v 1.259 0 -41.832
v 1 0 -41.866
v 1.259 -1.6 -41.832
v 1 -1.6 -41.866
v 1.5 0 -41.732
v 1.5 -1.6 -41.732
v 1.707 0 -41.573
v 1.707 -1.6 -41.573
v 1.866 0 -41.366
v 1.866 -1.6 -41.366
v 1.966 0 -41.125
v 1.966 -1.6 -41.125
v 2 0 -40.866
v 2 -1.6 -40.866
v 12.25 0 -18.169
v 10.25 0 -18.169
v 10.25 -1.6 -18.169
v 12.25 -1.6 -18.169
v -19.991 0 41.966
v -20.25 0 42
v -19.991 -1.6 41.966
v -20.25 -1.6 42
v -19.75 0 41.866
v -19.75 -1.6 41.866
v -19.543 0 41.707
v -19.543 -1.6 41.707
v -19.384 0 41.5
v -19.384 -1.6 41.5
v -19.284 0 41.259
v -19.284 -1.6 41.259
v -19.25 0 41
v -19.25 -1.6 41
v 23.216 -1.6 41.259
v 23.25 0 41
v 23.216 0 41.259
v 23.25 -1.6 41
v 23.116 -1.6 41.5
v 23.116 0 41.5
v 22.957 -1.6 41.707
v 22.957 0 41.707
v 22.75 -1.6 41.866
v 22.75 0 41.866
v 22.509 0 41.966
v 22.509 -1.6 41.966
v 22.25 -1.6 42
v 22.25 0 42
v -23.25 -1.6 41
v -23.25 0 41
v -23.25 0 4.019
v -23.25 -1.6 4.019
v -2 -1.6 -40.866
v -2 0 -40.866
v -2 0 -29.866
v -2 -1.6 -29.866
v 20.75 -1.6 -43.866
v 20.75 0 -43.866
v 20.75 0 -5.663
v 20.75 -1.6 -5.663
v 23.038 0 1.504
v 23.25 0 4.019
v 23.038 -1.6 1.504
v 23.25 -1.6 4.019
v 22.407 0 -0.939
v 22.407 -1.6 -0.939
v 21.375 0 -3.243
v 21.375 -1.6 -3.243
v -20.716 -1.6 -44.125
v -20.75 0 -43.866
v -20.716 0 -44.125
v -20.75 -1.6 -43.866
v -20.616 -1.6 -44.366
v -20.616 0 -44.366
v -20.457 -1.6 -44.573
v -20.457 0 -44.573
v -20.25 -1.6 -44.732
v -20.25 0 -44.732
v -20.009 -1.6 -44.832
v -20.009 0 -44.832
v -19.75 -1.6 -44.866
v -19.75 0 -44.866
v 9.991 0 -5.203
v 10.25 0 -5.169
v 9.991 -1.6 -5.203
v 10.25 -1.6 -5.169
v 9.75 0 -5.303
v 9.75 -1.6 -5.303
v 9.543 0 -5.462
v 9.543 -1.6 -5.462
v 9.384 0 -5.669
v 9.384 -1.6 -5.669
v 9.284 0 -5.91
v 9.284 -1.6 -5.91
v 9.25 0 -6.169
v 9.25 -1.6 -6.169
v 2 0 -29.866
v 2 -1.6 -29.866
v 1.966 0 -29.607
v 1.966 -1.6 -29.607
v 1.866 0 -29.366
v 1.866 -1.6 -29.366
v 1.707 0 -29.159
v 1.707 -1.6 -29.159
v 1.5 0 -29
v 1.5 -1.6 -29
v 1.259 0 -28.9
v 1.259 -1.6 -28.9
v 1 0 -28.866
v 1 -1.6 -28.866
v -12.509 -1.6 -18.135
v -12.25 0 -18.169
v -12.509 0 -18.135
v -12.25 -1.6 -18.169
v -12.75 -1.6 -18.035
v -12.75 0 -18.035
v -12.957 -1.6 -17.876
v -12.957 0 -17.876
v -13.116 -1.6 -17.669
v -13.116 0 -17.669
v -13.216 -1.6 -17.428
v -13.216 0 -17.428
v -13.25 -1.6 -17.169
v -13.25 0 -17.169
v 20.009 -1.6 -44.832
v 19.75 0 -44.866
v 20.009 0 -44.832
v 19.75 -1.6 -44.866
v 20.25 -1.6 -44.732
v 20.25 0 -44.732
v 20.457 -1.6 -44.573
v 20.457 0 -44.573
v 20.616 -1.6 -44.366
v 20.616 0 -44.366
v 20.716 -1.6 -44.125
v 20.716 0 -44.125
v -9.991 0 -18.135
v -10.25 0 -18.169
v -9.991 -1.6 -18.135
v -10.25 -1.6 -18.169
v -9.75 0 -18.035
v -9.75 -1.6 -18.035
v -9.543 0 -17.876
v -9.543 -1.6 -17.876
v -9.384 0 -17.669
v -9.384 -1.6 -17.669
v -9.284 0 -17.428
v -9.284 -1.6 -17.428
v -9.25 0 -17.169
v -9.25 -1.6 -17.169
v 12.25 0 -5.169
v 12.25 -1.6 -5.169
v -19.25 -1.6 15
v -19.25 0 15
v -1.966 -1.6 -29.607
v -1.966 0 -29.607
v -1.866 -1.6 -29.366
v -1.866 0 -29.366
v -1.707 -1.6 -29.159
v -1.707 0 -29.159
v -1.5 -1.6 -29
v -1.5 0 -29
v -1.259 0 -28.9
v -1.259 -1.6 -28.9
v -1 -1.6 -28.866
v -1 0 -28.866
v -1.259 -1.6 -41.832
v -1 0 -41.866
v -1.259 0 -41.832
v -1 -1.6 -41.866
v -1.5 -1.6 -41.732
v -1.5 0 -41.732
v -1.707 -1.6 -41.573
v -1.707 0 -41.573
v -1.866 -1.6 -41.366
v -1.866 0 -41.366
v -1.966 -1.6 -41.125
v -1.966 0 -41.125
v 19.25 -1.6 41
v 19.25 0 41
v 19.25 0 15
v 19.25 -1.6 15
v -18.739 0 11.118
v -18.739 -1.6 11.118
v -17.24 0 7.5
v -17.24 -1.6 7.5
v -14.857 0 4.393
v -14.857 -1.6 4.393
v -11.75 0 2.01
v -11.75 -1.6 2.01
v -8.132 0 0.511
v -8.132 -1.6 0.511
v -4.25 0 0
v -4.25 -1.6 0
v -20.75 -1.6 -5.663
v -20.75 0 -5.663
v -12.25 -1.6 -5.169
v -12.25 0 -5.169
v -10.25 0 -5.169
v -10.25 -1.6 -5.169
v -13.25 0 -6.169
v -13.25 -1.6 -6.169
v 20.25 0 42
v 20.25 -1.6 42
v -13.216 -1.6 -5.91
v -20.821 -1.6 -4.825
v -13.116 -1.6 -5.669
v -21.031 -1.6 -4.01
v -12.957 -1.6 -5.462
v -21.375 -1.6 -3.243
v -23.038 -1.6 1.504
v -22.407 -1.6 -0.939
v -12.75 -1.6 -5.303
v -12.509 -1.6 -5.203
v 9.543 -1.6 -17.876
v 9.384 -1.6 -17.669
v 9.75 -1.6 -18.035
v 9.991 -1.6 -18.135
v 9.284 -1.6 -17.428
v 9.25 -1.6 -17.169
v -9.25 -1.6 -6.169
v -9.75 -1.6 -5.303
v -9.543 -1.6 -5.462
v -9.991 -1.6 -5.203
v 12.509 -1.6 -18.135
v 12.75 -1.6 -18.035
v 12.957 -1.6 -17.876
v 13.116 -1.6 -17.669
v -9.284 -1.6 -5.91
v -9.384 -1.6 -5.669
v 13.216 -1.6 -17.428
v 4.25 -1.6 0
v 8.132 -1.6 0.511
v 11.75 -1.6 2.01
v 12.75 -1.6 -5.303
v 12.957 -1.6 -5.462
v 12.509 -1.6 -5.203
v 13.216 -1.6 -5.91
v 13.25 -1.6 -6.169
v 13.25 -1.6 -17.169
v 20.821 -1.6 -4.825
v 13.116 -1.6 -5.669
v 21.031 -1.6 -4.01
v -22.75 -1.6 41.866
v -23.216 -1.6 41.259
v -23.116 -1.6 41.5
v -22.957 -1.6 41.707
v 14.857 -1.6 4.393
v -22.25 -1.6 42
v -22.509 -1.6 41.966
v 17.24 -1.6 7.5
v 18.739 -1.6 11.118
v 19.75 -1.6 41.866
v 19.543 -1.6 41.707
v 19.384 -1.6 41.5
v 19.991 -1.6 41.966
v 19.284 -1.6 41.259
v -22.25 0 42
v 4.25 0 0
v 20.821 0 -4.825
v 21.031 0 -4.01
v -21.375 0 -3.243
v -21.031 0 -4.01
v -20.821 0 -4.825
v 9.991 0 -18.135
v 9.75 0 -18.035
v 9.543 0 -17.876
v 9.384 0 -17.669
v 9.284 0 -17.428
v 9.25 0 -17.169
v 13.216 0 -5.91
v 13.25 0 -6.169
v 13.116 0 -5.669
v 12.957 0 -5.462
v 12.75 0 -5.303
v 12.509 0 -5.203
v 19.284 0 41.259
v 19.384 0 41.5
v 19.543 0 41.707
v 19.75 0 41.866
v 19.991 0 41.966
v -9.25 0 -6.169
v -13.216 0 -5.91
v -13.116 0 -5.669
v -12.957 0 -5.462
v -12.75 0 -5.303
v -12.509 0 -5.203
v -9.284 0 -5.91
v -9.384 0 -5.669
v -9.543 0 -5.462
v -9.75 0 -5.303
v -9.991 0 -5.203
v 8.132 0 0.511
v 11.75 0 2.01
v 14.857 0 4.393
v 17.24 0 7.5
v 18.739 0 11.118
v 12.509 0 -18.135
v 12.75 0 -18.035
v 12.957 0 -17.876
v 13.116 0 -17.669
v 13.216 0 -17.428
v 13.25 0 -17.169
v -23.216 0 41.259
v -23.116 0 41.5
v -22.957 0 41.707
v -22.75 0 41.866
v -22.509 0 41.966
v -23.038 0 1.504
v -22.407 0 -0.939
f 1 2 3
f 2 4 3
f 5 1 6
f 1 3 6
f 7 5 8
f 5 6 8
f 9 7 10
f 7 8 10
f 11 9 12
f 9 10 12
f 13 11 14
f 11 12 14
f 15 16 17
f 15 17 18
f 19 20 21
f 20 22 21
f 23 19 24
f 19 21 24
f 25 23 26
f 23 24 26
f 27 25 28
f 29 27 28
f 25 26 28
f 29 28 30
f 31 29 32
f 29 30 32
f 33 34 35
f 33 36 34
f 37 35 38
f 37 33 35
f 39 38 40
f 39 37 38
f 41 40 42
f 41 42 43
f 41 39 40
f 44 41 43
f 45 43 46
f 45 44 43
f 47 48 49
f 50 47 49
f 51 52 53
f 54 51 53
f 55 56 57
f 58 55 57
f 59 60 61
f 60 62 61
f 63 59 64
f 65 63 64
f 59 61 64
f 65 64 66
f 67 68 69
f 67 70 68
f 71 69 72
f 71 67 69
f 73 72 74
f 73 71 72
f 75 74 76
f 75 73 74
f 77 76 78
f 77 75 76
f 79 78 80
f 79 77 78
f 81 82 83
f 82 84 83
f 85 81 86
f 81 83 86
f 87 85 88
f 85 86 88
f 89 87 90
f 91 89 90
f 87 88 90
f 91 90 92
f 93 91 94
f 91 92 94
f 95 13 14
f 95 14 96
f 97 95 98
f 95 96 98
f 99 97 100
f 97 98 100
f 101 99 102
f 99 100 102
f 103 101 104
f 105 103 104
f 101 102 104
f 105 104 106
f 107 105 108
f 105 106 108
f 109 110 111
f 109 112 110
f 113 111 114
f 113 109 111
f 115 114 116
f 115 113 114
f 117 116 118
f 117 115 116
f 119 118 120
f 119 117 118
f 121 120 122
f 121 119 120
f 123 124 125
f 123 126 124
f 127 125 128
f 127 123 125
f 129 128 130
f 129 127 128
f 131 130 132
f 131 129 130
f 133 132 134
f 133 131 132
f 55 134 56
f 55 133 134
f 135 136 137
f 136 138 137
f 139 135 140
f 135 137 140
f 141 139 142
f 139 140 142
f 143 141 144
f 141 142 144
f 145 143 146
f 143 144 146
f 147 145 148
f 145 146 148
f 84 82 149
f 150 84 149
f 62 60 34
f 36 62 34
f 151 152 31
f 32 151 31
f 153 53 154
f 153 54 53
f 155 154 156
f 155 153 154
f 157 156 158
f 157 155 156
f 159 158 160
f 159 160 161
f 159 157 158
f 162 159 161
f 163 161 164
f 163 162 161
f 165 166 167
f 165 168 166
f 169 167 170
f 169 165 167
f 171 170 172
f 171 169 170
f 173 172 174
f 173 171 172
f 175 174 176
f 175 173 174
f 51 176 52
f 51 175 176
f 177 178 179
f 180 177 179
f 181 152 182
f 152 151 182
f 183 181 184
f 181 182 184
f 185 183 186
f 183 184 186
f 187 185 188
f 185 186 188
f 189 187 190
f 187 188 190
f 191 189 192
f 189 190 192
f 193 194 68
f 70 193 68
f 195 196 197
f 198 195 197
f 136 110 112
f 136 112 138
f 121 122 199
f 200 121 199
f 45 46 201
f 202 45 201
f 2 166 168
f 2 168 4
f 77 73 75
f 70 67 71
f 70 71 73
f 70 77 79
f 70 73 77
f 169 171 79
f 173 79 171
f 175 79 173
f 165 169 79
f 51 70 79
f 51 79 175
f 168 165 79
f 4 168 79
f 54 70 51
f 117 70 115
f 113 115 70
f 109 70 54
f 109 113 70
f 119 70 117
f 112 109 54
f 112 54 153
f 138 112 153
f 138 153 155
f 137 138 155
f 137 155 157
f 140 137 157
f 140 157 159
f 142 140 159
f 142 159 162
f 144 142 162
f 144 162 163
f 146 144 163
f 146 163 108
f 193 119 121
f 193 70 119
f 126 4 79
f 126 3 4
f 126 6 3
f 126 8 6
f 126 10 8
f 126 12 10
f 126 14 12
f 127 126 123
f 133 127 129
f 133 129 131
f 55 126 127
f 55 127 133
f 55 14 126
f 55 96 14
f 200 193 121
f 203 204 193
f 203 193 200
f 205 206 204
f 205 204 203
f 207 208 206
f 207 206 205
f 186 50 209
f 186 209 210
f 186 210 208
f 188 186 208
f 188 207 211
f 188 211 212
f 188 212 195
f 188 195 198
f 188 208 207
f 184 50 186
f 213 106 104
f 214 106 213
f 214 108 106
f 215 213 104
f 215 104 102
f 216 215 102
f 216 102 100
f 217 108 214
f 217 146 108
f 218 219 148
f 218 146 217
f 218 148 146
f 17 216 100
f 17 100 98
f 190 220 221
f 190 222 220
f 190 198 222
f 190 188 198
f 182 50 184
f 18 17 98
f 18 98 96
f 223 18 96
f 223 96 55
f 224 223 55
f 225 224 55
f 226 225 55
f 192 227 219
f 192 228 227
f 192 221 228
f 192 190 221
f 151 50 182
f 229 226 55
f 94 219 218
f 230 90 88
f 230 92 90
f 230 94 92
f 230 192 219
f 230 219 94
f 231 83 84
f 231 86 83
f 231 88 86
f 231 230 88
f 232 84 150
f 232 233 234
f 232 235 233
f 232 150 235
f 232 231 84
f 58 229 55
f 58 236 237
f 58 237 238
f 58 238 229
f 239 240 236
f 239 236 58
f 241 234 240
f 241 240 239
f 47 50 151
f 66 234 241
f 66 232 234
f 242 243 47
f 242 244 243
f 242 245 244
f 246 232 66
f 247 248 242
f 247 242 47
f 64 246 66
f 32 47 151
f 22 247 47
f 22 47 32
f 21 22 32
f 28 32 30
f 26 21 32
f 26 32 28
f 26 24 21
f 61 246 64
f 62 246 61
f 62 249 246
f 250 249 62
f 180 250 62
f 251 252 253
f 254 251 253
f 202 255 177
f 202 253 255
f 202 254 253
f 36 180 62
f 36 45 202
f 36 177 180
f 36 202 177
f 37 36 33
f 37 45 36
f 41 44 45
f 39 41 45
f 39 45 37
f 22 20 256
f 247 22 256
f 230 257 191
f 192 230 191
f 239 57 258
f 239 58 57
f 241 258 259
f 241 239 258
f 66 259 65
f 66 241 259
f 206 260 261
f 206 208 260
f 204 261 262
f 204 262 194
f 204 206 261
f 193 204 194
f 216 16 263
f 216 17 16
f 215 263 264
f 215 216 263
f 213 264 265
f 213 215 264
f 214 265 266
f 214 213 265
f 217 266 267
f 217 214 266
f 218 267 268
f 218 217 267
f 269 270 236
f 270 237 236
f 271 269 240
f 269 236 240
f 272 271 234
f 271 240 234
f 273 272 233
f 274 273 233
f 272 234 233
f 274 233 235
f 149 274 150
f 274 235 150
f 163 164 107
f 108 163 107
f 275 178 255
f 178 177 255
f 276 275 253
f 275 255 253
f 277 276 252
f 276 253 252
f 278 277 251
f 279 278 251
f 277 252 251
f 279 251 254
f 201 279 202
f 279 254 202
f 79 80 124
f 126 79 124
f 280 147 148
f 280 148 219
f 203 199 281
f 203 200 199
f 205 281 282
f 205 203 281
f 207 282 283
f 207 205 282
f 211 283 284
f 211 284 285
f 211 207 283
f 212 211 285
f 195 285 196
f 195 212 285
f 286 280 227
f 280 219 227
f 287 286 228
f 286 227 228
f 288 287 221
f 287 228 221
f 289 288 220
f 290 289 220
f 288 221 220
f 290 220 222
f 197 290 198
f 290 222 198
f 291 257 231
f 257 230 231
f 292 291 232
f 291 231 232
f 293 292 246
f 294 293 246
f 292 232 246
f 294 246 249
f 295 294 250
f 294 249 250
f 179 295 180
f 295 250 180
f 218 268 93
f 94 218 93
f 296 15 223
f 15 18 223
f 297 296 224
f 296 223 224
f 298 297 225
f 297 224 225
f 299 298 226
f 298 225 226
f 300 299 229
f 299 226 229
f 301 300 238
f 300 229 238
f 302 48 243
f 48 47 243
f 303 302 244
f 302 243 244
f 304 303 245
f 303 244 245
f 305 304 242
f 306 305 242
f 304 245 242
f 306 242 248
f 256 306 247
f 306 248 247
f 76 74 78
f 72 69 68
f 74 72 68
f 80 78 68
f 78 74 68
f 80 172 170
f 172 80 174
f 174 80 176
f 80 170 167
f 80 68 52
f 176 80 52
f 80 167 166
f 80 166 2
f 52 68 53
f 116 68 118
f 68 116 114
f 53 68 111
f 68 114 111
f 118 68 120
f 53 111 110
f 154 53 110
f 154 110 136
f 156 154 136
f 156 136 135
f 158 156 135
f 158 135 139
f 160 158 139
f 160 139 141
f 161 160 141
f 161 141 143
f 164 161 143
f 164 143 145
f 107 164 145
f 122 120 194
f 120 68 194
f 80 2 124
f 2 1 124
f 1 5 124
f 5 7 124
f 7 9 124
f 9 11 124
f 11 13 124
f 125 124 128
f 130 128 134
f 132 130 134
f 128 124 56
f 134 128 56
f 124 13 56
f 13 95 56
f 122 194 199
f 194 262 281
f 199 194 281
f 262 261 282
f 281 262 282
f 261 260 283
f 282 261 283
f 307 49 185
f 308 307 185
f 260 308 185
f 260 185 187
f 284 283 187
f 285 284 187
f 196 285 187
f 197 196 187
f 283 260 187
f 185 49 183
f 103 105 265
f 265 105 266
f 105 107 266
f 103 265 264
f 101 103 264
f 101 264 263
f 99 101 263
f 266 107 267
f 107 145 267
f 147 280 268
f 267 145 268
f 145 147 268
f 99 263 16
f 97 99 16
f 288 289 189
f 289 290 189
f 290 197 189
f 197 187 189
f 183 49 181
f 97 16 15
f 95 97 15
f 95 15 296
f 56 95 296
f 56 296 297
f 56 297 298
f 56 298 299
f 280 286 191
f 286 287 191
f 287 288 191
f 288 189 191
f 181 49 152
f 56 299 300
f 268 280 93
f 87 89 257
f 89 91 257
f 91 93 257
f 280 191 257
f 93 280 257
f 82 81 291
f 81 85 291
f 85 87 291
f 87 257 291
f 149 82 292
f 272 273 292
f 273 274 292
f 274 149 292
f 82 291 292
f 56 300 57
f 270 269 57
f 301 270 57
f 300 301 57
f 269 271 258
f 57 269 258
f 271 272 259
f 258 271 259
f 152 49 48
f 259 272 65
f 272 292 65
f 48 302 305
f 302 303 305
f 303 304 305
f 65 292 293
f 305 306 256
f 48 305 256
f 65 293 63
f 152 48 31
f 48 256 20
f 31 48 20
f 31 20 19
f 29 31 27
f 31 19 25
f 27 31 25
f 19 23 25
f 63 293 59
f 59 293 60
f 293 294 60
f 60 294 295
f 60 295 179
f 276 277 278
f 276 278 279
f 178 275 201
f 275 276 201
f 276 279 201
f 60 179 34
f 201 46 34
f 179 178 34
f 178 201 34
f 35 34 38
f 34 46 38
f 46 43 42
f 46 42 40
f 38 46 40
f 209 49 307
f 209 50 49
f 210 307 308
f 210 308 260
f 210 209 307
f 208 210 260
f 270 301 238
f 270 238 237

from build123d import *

# Parameters (mm, degrees)
F0_W     = 4
F0_H     = 13
F1_DEPTH = 1.6
F2_R     = 15
F3_R     = 5
F4_R     = 1


# Not quite as in the source:
# - a feature names something its author has since deleted; it is built from what else it names


with BuildPart() as f1:
    # F0 (on Front) → F1 (new body)
    with BuildSketch(Plane.XZ):
        Polygon((-19.25, 42), (-23.25, 42), (-23.25, 0), (-20.75, -4.3301270189), (-20.75, -44.8660254038), (20.75, -44.8660254038), (20.75, -4.3301270189), (23.25, 0), (23.25, 42), (19.25, 42), (19.25, 0), (-19.25, 0), align=None)
        with Locations((-11.25, -11.6689147807)):
            Rectangle(F0_W, F0_H, mode=Mode.SUBTRACT)
        with Locations((0, -35.3660254038)):
            Rectangle(F0_W, F0_H, mode=Mode.SUBTRACT)
        with Locations((11.25, -11.6689147807)):
            Rectangle(F0_W, F0_H, mode=Mode.SUBTRACT)
    extrude(amount=F1_DEPTH)

    # F2
    f2_edges = [f1.edges().sort_by_distance(p)[0] for p in [
        (-19.25, -0.8, 0),
        (19.25, -0.8, 0),
        (23.25, -0.8, 0),
        (-23.25, -0.8, 0),
    ]]
    fillet(f2_edges, radius=F2_R)

    # F3
    f3_edges = [f1.edges().sort_by_distance(p)[0] for p in [
        (-20.75, -0.8, -4.330127),
        (20.75, -0.8, -4.330127),
    ]]
    fillet(f3_edges, radius=F3_R)

    # F4
    f4_edges = [f1.edges().sort_by_distance(p)[0] for p in [
        (-13.25, -0.8, -5.168915),
        (-13.25, -0.8, -18.168915),
        (-9.25, -0.8, -5.168915),
        (-9.25, -0.8, -18.168915),
        (13.25, -0.8, -18.168915),
        (13.25, -0.8, -5.168915),
        (9.25, -0.8, -5.168915),
        (9.25, -0.8, -18.168915),
        (-2, -0.8, -41.866025),
        (-2, -0.8, -28.866025),
        (2, -0.8, -28.866025),
        (2, -0.8, -41.866025),
        (20.75, -0.8, -44.866025),
        (-20.75, -0.8, -44.866025),
        (-19.25, -0.8, 42),
        (-23.25, -0.8, 42),
        (19.25, -0.8, 42),
        (23.25, -0.8, 42),
    ]]
    fillet(f4_edges, radius=F4_R)


solid = f1.part
